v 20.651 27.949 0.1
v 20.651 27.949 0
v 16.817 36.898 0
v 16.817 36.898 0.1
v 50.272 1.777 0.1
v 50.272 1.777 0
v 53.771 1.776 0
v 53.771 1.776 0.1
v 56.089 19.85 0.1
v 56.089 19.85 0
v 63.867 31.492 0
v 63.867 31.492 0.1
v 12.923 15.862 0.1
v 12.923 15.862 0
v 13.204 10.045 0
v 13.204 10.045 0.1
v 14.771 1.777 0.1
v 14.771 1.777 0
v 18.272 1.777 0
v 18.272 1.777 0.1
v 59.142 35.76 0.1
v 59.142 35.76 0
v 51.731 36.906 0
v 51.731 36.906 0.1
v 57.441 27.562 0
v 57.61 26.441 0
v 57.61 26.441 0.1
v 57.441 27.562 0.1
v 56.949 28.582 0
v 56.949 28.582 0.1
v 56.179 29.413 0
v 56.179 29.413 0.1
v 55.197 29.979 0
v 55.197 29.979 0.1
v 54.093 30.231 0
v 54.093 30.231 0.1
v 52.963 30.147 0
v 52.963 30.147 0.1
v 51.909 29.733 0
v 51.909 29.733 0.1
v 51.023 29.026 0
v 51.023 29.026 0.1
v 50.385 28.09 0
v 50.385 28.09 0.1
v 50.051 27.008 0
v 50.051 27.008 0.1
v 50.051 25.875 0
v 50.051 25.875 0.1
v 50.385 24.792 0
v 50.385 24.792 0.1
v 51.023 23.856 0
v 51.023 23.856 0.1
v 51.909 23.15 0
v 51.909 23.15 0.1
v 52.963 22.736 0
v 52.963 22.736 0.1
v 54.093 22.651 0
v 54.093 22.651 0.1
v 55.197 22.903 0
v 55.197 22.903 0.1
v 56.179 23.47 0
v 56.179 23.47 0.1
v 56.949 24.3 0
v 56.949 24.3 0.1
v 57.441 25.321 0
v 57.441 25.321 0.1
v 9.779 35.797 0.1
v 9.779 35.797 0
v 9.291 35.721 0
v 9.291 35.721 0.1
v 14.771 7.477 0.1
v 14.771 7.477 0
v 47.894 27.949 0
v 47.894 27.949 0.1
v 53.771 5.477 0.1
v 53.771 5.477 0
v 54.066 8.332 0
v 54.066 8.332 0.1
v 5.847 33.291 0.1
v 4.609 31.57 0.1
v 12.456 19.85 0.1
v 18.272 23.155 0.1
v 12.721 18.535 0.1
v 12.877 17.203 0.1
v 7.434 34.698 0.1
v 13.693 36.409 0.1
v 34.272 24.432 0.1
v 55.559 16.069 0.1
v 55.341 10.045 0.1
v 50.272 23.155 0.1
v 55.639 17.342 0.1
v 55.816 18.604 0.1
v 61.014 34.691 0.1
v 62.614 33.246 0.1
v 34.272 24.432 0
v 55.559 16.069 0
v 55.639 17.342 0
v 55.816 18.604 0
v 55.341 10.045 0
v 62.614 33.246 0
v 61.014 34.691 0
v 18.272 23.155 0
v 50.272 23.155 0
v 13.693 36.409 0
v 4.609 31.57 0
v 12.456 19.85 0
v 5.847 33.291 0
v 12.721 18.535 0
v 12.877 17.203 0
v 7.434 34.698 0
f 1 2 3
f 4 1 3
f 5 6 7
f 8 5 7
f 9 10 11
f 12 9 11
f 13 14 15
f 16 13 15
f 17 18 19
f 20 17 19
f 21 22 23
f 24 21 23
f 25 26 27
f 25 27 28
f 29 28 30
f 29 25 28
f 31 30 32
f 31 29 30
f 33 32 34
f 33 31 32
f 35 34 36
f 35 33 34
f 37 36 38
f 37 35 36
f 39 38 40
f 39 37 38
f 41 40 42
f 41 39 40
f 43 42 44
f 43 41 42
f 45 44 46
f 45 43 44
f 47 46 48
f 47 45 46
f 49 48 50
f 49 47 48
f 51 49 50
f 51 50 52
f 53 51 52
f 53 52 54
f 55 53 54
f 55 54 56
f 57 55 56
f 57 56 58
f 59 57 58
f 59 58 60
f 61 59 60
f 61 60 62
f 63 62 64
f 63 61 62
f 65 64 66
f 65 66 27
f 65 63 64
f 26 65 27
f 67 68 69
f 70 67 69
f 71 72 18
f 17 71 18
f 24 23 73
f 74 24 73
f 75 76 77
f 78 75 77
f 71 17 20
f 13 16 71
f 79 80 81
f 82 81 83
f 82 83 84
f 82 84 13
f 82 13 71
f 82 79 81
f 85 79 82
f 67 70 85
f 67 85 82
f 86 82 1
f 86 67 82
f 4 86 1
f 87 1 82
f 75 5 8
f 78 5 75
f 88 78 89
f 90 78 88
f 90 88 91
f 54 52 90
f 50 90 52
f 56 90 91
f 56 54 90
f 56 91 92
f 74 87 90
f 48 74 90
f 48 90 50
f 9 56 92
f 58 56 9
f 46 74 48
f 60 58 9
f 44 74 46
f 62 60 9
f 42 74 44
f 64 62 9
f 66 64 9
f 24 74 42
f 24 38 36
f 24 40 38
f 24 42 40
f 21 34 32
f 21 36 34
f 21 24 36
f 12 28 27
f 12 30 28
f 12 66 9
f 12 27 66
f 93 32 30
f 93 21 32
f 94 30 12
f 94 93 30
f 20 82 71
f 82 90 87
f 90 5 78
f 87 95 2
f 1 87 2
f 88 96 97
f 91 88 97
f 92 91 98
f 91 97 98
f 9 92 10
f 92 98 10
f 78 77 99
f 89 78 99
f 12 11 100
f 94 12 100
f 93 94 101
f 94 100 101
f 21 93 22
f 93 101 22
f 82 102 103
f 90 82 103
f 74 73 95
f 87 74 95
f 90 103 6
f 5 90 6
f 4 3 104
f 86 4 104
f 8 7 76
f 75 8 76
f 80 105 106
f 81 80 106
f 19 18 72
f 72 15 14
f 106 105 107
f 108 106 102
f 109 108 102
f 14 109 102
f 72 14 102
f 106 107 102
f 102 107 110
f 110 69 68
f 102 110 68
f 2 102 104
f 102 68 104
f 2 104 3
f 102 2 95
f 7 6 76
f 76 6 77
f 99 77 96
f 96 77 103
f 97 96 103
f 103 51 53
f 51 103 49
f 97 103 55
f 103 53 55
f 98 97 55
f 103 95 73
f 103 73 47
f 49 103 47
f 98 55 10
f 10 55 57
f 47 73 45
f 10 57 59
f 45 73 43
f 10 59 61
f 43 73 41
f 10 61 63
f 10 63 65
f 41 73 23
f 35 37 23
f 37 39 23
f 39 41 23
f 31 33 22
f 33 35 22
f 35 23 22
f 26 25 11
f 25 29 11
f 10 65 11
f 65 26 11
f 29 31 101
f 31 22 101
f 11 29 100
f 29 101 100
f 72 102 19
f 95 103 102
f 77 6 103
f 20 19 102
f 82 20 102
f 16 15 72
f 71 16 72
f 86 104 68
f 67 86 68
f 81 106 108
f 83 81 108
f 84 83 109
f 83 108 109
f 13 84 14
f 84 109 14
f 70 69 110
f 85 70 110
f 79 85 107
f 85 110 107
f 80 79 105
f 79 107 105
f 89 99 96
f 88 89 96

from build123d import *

# Parameters (mm, degrees)
MODEL_R                 = 3.800728286
SALIENTE_EXTRUIR1_DEPTH = 0.1


with BuildPart() as part:
    # Model → Saliente-Extruir1 (new body)
    with BuildSketch(Plane.XY):
        with BuildLine():
            Line((13.692923281, 36.409278797), (9.778554106, 35.797482596))
            Line((9.778554106, 35.797482596), (9.291241734, 35.721318124))
            ThreePointArc((9.291241734, 35.721318124), (6.601579479, 34.038755415), (4.608572881, 31.570309544))
            Line((4.608572881, 31.570309544), (12.45581545, 19.849854112))
            ThreePointArc((12.45581545, 19.849854112), (12.812940227, 17.870349583), (12.922946265, 15.861898697))
            Line((12.922946265, 15.861898697), (13.203519251, 10.044821535))
            Line((13.203519251, 10.044821535), (14.770932303, 7.477024351))
            Line((14.770932303, 7.477024351), (14.770932303, 4.477024351))
            Line((14.770932303, 4.477024351), (14.770932303, 1.777024351))
            Line((14.770932303, 1.777024351), (18.272189759, 1.777024351))
            Line((18.272189759, 1.777024351), (18.272189759, 23.155058368))
            Line((18.272189759, 23.155058368), (33.772189759, 23.155058368))
            Line((33.772189759, 23.155058368), (34.772189759, 23.155058368))
            Line((34.772189759, 23.155058368), (50.272189759, 23.155058368))
            Line((50.272189759, 23.155058368), (50.272189759, 1.777024351))
            Line((50.272189759, 1.777024351), (53.770932303, 1.775742122))
            Line((53.770932303, 1.775742122), (53.770932303, 5.477024351))
            Line((53.770932303, 5.477024351), (54.065641416, 8.331670065))
            Line((54.065641416, 8.331670065), (55.340860267, 10.044821535))
            Line((55.340860267, 10.044821535), (55.55942352, 16.069253716))
            ThreePointArc((55.55942352, 16.069253716), (55.715346099, 17.974760468), (56.088564069, 19.849854112))
            Line((56.088564069, 19.849854112), (63.866724949, 31.491817154))
            ThreePointArc((63.866724949, 31.491817154), (61.853109226, 34.011935883), (59.141967464, 35.759893842))
            Line((59.141967464, 35.759893842), (51.731314314, 36.906395207))
            Line((51.731314314, 36.906395207), (47.893743211, 27.949013218))
            Line((47.893743211, 27.949013218), (34.272189759, 24.431748181))
            Line((34.272189759, 24.431748181), (20.650636308, 27.949013218))
            Line((20.650636308, 27.949013218), (16.81686132, 36.89753459))
            Line((16.81686132, 36.89753459), (13.692923281, 36.409278797))
        make_face()
        with Locations((53.808865901, 26.441300342)):
            Circle(MODEL_R, mode=Mode.SUBTRACT)
    extrude(amount=SALIENTE_EXTRUIR1_DEPTH)


solid = part.part
